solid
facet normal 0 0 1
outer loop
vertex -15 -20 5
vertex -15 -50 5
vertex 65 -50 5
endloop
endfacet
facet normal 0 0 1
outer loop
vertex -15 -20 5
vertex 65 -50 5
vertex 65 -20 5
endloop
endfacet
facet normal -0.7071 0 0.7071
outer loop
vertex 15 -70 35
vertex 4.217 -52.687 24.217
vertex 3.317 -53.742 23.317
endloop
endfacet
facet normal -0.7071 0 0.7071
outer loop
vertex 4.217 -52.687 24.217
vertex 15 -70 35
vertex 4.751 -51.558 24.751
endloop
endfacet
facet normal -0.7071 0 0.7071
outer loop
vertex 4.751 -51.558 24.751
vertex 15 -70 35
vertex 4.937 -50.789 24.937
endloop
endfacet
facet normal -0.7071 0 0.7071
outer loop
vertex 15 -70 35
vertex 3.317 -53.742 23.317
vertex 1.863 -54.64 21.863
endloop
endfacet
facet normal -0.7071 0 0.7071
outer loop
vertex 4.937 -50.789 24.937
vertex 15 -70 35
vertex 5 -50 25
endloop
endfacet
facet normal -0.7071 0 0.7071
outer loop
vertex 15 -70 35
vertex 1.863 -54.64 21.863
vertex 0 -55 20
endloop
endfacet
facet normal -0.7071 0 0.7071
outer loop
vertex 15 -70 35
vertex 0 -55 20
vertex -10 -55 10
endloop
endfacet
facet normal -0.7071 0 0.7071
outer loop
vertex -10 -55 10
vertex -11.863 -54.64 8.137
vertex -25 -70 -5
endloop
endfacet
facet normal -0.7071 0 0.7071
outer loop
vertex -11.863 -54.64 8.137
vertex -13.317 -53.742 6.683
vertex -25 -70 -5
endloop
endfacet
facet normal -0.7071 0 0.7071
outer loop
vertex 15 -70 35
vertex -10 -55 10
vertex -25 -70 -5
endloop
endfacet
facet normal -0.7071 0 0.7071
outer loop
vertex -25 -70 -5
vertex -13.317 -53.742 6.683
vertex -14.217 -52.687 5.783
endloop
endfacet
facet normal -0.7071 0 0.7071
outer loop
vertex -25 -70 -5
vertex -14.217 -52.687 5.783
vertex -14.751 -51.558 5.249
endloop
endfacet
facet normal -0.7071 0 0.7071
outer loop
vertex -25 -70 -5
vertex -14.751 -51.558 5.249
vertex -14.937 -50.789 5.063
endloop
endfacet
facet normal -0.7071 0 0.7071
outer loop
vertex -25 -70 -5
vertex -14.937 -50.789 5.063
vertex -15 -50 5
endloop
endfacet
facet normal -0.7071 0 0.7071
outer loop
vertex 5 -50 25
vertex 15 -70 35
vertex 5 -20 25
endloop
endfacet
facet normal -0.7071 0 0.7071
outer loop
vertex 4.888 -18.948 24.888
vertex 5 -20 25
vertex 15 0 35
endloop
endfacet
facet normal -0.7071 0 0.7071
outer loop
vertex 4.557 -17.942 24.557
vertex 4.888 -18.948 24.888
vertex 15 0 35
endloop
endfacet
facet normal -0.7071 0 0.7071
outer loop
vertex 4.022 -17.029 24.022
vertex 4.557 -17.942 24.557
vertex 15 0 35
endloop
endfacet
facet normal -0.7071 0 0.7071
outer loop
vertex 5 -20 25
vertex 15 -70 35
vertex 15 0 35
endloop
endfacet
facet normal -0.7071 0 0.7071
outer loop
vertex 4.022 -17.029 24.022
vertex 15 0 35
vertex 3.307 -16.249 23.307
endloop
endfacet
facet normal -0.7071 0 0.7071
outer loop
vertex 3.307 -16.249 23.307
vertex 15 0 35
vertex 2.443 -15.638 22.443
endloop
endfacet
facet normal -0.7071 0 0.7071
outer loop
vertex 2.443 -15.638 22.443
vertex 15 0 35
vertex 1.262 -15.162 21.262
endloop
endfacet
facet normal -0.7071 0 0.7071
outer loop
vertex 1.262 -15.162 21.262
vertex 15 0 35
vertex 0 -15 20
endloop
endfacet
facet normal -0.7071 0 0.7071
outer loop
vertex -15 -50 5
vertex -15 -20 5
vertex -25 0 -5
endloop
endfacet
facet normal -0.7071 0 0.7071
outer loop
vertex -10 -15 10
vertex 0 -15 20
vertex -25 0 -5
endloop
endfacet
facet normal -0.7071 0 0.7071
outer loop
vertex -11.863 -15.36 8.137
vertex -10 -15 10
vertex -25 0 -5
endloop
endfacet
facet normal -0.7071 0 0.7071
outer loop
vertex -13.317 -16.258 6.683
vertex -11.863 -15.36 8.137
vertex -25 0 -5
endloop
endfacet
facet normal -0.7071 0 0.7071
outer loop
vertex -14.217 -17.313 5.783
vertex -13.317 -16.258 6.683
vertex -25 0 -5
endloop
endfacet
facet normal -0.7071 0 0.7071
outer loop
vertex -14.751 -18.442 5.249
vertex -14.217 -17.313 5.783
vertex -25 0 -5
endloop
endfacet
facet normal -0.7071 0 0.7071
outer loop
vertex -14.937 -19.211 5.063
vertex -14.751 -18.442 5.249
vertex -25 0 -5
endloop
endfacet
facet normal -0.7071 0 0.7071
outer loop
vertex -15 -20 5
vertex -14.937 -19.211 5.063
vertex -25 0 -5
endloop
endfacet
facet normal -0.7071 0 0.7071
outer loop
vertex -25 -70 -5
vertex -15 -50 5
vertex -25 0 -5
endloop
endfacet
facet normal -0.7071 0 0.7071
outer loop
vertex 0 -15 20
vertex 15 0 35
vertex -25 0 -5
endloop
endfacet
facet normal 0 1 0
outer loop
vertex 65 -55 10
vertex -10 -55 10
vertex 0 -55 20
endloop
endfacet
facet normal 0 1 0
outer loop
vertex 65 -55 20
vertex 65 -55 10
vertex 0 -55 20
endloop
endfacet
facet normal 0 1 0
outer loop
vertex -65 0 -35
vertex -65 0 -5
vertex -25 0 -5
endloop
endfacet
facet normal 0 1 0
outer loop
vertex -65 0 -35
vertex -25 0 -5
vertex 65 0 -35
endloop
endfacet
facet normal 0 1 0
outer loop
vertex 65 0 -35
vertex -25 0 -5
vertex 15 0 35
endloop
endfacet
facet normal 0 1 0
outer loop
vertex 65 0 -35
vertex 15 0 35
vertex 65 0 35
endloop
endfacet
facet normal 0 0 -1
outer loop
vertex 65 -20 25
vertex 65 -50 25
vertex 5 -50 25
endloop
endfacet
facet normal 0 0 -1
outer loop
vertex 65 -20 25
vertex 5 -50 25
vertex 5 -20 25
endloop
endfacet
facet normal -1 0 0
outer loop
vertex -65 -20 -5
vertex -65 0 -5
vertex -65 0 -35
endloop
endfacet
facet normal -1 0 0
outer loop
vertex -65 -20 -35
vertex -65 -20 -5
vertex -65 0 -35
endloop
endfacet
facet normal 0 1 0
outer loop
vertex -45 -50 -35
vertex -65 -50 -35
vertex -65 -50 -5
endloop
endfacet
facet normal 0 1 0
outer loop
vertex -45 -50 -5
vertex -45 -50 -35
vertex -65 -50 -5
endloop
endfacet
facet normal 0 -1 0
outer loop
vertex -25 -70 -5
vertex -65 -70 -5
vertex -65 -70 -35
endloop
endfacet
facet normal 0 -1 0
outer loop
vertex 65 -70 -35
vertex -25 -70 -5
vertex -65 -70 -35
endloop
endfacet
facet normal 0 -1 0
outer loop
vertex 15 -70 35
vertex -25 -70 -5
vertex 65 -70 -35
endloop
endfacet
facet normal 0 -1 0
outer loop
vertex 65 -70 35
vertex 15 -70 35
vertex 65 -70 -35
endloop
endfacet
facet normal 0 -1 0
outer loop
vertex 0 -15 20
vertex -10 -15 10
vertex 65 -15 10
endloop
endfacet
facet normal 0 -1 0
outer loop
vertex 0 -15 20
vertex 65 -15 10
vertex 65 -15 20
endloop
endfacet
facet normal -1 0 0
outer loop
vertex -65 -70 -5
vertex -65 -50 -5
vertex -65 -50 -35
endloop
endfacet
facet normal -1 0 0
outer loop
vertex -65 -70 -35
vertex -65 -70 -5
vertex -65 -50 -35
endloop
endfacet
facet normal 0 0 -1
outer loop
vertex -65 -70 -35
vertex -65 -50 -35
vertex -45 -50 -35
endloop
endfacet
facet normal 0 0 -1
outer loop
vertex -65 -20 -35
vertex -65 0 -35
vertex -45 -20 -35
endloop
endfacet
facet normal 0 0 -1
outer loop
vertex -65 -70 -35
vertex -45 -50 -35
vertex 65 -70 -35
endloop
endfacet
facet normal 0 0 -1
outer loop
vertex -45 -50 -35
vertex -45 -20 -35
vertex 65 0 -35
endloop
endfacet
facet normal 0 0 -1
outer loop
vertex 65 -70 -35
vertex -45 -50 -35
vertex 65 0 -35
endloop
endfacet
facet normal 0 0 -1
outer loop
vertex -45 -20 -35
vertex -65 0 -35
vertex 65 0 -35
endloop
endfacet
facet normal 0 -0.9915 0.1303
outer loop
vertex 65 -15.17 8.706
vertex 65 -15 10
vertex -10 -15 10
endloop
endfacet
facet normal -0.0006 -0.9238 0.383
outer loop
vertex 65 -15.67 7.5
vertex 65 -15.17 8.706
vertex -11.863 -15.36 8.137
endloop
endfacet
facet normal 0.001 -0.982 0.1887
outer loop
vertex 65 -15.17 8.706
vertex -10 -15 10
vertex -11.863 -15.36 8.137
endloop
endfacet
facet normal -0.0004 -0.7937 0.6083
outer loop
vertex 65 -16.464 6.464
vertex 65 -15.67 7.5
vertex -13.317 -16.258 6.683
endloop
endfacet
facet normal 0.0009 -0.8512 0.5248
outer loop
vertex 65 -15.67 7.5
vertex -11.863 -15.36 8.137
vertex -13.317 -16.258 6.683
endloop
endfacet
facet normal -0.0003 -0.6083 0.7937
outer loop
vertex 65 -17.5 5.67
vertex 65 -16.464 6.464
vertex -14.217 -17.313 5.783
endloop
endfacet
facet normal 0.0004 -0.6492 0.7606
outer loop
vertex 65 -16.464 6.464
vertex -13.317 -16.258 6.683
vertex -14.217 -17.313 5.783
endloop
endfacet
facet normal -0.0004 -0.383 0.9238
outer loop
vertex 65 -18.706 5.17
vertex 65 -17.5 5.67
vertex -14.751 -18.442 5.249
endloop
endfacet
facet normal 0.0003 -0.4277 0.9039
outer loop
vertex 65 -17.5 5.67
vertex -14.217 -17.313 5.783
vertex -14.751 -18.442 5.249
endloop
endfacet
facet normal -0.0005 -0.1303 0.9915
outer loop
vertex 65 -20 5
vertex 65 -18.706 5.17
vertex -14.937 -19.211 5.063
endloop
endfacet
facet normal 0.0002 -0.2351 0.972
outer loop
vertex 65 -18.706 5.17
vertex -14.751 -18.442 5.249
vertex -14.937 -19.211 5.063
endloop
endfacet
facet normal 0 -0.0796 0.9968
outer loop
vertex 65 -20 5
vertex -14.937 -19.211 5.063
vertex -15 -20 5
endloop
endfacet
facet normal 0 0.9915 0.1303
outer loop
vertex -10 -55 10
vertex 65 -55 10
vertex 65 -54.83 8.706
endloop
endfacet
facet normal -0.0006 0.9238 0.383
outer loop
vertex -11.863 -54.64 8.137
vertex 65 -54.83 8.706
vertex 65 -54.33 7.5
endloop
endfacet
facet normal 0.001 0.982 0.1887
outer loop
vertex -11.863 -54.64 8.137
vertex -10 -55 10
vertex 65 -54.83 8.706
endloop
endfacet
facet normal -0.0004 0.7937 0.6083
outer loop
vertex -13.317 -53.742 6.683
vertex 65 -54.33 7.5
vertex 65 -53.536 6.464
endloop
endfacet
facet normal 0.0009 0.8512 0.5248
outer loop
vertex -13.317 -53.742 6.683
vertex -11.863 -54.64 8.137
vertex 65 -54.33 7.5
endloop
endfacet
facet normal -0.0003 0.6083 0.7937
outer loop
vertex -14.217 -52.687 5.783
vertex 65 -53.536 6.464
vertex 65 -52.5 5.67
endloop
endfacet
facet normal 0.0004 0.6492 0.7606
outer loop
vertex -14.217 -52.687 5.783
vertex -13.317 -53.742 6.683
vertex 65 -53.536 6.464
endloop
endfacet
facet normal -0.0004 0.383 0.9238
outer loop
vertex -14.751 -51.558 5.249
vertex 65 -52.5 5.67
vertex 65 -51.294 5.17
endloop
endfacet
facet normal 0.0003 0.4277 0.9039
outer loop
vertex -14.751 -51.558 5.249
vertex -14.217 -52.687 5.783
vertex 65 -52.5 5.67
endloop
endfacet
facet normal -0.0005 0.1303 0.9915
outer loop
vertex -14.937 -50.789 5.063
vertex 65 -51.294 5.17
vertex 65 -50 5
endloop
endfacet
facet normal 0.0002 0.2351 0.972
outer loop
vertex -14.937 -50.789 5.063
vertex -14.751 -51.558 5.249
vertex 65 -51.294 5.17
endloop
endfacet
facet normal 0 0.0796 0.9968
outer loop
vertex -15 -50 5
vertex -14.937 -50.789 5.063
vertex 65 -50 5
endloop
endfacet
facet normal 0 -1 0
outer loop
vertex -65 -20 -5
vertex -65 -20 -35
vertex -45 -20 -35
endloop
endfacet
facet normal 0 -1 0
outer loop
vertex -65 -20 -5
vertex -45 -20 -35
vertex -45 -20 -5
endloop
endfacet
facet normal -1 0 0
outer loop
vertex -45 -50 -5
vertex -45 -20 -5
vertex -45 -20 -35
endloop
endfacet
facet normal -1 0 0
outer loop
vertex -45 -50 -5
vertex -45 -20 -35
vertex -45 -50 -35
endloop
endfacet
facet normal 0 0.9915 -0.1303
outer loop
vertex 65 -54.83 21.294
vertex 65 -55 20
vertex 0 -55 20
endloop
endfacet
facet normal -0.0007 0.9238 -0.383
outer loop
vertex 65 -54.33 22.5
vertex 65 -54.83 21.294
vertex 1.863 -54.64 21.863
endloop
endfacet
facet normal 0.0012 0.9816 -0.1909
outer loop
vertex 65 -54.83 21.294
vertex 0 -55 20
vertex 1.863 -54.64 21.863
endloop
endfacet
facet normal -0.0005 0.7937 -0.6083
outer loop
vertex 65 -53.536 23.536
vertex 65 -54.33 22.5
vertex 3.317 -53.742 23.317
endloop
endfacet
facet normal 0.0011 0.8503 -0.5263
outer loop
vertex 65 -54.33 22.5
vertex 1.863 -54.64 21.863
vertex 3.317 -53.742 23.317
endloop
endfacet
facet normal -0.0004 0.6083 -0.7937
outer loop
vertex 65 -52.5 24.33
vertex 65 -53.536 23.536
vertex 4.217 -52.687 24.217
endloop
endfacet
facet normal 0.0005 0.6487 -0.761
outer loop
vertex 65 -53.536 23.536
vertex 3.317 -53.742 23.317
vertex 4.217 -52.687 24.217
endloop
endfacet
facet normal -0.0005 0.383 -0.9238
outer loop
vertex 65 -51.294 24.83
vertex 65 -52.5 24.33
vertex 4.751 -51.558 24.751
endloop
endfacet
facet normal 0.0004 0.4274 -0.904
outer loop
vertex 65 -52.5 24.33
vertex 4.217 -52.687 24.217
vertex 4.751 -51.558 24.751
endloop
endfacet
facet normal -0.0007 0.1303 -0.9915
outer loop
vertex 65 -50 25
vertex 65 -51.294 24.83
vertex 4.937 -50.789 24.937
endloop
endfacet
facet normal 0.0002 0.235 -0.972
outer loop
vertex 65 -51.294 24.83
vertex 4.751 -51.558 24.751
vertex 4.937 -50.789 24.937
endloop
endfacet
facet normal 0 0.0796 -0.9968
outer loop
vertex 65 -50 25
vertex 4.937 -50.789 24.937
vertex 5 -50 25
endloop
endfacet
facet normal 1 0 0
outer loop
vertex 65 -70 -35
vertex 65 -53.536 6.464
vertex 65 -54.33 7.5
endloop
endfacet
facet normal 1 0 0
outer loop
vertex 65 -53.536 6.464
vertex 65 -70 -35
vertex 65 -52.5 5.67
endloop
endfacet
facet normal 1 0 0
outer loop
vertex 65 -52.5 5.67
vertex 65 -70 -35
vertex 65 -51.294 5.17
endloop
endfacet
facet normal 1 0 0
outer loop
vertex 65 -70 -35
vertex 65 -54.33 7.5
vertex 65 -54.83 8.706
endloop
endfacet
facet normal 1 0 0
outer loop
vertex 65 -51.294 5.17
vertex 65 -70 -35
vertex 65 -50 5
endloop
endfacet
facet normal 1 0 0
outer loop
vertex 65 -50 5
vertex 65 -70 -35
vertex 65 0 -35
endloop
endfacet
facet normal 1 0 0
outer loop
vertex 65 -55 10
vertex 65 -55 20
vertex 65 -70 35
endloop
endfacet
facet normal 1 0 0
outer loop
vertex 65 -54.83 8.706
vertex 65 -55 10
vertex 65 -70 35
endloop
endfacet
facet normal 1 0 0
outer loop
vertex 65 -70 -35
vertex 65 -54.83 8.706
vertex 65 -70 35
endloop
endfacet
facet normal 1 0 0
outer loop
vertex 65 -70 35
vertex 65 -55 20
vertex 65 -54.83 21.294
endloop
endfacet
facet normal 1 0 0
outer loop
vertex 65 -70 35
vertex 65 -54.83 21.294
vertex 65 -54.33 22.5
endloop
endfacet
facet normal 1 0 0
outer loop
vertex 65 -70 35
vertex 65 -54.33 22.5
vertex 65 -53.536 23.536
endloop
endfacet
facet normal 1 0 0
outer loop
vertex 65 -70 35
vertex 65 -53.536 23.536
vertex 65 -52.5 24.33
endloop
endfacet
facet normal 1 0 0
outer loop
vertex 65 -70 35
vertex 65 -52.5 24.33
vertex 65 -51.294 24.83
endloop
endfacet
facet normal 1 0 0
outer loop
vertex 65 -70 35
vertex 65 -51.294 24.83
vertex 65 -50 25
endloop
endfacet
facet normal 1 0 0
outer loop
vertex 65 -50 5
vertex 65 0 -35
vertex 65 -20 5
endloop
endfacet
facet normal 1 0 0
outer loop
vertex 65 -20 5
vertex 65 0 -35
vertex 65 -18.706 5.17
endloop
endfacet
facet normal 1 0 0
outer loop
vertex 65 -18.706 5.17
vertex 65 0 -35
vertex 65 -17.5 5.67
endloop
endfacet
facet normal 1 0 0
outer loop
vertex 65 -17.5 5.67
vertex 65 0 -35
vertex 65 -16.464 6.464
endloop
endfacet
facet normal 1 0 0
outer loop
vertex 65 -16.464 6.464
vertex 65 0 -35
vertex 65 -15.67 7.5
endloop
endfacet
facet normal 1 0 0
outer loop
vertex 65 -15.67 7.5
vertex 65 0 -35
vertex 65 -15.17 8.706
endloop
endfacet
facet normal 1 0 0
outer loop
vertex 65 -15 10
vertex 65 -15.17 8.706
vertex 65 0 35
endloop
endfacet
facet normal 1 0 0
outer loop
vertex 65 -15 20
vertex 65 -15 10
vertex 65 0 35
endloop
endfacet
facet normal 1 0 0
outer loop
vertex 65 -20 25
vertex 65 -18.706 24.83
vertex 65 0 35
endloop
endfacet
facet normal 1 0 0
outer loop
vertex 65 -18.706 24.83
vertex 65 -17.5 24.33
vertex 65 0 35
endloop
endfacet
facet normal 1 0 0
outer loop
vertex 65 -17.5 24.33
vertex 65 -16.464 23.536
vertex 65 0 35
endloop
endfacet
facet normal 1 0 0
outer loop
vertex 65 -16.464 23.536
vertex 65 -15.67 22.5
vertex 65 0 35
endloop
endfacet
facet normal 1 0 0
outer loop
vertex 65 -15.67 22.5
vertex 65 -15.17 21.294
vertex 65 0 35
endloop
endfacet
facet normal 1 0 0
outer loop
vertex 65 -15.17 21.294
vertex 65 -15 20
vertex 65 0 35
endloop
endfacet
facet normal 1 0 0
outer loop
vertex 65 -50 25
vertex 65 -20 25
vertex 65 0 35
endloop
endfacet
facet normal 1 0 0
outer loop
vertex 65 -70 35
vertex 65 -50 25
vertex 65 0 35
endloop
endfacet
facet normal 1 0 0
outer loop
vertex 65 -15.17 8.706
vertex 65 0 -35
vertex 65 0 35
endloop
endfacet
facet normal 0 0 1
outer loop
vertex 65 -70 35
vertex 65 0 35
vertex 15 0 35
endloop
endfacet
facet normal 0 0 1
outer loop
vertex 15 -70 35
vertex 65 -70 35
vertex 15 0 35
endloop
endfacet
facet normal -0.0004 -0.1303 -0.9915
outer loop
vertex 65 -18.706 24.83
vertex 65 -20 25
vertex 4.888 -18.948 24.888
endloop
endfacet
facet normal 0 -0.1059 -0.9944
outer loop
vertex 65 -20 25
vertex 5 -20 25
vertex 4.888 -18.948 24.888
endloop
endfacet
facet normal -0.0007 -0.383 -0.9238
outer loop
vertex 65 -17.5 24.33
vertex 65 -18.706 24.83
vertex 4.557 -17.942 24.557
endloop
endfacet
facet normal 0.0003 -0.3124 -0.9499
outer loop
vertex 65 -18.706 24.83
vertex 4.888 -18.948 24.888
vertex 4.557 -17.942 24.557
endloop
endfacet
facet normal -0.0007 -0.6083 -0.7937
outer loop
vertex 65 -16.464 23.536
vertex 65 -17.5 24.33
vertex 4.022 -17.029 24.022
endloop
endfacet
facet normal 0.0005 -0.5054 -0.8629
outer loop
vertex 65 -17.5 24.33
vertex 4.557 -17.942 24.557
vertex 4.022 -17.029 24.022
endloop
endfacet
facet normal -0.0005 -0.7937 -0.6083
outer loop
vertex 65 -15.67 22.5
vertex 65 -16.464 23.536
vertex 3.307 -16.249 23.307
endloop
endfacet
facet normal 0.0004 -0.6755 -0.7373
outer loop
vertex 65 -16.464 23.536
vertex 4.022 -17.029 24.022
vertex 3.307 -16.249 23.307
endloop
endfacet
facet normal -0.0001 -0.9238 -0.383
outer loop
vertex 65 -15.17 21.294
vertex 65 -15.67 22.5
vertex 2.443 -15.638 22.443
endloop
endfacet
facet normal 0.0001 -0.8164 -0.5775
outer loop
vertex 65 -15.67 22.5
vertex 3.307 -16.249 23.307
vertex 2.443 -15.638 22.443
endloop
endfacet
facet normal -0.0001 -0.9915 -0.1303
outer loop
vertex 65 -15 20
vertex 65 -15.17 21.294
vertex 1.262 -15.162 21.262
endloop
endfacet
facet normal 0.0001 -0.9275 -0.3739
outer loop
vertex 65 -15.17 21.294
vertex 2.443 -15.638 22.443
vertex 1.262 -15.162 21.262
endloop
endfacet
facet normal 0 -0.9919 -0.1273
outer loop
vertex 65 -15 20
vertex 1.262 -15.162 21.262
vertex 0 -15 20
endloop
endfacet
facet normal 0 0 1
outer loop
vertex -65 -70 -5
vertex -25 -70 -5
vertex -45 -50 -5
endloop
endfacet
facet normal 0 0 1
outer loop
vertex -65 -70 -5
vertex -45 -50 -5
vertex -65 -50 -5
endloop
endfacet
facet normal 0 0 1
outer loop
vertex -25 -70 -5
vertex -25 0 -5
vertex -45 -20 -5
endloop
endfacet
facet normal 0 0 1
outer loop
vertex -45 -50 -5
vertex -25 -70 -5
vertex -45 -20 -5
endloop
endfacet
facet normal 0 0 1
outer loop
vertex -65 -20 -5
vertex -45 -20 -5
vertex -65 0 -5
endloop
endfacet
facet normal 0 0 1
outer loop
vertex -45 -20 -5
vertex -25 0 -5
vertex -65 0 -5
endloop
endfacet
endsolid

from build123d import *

# Parameters (mm, degrees)
F1_DEPTH = 70
F2_W     = 40
F2_H     = 20
F3_DEPTH = 130.001
F4_R     = 5
F5_W     = 30
F5_H     = 30
F6_DEPTH = 20


with BuildPart() as f1:
    # F0 (on Front) → F1 (new body)
    with BuildSketch(Plane.XZ):
        Polygon((65, 35), (15, 35), (-25, -5), (-65, -5), (-65, -35), (65, -35), align=None)
    extrude(amount=F1_DEPTH)

    # F2 (on face) → F3 (cut, through all)
    with BuildSketch(Plane.YZ.offset(65)):
        with Locations((-35, 15)):
            Rectangle(F2_W, F2_H)
    extrude(amount=-F3_DEPTH, mode=Mode.SUBTRACT)

    # F4
    f4_edges = [f1.edges().sort_by_distance(p)[0] for p in [
        (25, -55, 5),
        (25, -15, 5),
        (35, -15, 25),
        (35, -55, 25),
    ]]
    fillet(f4_edges, radius=F4_R)

    # F5 (on face) → F6 (cut)
    with BuildSketch(Plane(origin=(-65, 0, 0), x_dir=(0, -1, 0), z_dir=(-1, 0, 0))):
        with Locations((35, -20)):
            Rectangle(F5_W, F5_H)
    extrude(amount=-F6_DEPTH, mode=Mode.SUBTRACT)


solid = f1.part
